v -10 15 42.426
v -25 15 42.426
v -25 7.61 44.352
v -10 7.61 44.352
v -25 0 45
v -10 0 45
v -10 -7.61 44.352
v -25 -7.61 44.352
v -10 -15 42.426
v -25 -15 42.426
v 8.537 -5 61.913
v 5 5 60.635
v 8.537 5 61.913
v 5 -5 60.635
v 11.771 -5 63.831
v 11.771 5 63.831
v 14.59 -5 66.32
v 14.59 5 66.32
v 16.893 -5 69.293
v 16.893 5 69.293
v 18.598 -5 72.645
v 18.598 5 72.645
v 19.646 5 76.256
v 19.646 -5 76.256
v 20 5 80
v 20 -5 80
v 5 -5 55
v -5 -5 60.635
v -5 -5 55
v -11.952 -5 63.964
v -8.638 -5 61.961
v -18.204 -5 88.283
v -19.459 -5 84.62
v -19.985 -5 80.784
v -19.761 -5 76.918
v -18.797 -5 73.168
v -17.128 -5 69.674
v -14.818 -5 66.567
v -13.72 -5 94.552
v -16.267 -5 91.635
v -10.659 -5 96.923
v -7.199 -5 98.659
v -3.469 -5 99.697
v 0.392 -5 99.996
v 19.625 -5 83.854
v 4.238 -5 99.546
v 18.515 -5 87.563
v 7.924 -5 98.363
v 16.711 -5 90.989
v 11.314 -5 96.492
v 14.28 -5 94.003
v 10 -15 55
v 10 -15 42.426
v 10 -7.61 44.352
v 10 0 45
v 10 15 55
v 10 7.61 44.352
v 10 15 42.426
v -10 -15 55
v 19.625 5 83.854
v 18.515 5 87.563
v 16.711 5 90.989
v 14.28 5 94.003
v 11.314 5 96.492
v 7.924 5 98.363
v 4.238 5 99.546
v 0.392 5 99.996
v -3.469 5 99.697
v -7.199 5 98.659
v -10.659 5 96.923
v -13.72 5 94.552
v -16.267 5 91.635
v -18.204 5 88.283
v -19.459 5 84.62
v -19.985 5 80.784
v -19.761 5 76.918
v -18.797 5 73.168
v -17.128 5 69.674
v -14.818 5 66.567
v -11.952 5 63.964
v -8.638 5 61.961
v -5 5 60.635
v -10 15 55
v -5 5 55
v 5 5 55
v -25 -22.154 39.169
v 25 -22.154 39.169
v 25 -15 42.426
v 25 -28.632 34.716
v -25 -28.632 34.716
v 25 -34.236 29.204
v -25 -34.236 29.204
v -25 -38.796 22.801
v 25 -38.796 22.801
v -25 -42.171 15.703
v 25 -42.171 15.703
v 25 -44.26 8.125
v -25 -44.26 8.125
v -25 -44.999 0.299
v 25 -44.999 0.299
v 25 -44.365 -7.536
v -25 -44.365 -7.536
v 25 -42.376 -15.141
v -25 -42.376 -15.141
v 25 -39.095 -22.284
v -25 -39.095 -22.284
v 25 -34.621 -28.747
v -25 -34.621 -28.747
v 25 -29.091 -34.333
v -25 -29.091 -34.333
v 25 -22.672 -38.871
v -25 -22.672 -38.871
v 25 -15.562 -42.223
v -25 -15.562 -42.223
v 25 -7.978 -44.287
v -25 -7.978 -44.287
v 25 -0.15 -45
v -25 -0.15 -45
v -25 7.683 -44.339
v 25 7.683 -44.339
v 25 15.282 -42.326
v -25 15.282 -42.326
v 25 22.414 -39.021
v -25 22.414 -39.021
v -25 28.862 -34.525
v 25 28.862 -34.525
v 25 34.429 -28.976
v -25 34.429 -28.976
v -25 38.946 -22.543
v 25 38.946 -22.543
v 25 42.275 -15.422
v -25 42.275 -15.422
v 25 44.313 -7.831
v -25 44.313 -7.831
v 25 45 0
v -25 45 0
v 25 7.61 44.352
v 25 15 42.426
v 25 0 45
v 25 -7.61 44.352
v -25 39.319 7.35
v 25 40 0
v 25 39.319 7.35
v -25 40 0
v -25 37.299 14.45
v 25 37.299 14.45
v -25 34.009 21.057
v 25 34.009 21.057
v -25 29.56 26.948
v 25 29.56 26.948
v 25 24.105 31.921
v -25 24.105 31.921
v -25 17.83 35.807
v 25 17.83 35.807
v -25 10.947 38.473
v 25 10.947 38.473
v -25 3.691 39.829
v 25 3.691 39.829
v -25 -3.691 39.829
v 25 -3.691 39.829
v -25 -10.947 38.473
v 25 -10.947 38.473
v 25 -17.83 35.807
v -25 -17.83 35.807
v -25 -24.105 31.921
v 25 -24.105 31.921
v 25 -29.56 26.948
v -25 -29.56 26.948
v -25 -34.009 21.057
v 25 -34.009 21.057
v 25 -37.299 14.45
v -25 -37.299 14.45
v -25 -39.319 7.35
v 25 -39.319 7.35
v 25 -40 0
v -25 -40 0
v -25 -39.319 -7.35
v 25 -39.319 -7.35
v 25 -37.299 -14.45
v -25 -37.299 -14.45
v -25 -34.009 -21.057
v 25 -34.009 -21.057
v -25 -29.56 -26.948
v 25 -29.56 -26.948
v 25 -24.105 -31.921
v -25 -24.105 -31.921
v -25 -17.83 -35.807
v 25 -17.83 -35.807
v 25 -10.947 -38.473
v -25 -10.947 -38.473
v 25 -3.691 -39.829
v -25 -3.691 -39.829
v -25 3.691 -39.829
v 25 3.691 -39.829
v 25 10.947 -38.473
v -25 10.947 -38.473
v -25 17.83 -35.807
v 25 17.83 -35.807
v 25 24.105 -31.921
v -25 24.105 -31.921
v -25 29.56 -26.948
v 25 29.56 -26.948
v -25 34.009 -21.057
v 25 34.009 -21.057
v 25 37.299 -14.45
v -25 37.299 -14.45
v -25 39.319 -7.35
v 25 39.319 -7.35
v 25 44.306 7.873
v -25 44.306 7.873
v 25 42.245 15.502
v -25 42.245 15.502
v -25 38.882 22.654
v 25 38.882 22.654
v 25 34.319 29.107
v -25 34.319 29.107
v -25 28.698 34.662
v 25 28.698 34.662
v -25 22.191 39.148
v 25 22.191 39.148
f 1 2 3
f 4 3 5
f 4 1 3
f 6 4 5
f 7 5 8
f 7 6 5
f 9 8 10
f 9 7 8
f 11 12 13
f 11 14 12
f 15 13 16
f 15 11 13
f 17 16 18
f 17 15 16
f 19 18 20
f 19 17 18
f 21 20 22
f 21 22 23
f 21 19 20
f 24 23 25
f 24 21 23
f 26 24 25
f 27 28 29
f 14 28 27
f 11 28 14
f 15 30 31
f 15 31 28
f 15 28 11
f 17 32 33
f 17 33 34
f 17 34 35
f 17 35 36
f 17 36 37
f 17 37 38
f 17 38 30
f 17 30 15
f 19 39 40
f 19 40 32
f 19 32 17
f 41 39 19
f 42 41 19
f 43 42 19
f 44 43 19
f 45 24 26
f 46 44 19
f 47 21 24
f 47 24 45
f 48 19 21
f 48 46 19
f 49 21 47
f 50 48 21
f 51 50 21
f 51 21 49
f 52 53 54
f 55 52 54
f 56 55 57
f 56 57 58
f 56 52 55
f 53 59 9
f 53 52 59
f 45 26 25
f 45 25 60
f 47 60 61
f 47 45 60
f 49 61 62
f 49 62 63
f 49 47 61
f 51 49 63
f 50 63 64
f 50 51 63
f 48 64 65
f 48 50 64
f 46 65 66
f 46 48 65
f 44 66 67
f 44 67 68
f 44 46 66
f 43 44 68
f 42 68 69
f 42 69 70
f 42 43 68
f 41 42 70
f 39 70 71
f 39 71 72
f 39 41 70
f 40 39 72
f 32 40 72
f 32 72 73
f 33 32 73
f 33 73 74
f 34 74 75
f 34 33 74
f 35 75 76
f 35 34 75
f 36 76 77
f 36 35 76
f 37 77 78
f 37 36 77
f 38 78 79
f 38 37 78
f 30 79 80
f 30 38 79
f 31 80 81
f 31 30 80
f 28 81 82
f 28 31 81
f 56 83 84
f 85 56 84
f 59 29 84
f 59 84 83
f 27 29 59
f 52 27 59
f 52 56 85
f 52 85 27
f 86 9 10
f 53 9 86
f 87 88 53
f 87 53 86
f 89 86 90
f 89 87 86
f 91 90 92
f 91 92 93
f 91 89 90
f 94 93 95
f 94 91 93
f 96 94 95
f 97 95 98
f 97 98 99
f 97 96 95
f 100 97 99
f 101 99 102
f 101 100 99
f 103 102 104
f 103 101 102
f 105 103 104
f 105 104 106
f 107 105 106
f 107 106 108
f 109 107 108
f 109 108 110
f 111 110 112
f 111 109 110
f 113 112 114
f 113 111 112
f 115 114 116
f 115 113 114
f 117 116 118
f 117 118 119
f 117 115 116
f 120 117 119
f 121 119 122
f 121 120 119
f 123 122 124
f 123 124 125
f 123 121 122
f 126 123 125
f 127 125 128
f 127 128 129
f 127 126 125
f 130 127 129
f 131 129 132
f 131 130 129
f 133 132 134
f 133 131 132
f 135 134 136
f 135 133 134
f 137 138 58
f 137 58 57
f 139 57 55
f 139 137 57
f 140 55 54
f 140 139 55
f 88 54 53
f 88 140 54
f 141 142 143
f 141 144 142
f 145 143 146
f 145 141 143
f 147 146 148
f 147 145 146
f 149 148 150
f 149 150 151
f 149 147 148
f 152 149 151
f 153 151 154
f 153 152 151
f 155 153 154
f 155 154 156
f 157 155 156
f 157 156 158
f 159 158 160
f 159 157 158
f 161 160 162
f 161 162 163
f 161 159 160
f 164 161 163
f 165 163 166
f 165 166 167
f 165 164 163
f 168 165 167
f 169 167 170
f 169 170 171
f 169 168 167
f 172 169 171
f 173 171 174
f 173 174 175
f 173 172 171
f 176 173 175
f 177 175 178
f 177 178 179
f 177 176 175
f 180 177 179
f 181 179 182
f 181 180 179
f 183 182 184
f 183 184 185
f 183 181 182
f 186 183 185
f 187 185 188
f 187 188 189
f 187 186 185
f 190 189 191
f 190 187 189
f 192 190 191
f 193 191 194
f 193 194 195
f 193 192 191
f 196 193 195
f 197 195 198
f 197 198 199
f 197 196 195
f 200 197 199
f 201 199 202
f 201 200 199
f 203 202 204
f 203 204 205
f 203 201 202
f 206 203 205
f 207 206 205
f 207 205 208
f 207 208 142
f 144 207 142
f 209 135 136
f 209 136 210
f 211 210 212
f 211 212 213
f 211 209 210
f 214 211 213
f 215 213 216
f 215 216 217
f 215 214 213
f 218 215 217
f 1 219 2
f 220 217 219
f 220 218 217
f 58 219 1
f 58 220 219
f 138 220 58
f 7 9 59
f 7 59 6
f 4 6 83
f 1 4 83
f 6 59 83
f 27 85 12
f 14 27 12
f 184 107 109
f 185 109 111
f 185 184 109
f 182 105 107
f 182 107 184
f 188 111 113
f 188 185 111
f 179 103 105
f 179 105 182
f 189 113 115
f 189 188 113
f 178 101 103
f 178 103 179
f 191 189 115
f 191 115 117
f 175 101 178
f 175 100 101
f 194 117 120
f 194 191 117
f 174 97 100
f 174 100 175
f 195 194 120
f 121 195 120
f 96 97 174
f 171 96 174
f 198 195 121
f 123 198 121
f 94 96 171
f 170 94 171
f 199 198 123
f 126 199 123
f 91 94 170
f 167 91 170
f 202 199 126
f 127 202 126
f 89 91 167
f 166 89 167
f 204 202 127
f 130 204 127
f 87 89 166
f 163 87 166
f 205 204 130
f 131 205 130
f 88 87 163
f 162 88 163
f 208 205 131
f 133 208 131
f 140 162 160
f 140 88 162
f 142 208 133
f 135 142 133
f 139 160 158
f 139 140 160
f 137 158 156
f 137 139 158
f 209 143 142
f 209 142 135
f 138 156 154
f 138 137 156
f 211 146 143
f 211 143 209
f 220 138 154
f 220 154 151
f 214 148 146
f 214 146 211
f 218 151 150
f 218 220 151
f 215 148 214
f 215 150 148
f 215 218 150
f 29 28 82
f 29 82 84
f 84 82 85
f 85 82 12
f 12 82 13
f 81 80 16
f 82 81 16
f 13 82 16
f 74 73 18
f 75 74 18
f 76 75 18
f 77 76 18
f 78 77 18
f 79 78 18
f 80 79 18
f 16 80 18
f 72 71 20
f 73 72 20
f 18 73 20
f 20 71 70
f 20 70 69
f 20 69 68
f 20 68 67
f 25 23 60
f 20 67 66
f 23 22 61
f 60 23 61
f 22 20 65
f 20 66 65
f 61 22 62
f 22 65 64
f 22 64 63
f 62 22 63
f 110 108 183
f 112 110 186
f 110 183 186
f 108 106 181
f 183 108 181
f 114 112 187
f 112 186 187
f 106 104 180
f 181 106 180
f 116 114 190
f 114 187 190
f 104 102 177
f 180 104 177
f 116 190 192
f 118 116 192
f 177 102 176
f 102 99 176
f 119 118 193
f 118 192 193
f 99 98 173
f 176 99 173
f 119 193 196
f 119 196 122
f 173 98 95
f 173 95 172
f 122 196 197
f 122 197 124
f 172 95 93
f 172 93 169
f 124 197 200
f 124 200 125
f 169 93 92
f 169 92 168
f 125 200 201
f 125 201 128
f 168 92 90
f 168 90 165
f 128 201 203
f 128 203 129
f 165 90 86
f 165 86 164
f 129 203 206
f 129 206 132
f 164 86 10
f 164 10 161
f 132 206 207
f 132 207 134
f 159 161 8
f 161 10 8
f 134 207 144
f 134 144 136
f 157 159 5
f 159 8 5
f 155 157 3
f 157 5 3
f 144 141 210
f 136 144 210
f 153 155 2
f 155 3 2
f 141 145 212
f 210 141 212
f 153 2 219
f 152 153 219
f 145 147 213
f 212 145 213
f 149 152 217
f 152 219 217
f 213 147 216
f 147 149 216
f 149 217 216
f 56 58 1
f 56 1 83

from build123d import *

# Parameters (mm, degrees)
F0_R     = 40
F1_DEPTH = 25
F2_DEPTH = 10
F4_DEPTH = 5


with BuildPart() as f1:
    # F0 (on Right) → F1 (new body, symmetric)
    with BuildSketch(Plane.YZ):
        with BuildLine():
            ThreePointArc((-15, 42.426407), (-25.980762, -36.742346), (45, 0))
            ThreePointArc((45, 0), (36.742346, 25.980762), (15, 42.426407))
            ThreePointArc((15, 42.426407), (0, 45), (-15, 42.426407))
        make_face()
        Circle(F0_R, mode=Mode.SUBTRACT)
    extrude(amount=F1_DEPTH, both=True)

    # F0 (on Right) → F2 (join, symmetric)
    with BuildSketch(Plane.YZ):
        with BuildLine():
            ThreePointArc((-15, 42.426407), (0, 45), (15, 42.426407))
            Line((15, 42.426407), (15, 55))
            Line((15, 55), (-15, 55))
            Line((-15, 55), (-15, 42.426407))
        make_face()
    extrude(amount=F2_DEPTH, both=True)

    # F3 (on Front) → F4 (join, symmetric)
    with BuildSketch(Plane.XZ):
        with BuildLine():
            ThreePointArc((-5, 60.635083), (0, 60), (5, 60.635083))
            ThreePointArc((5, 60.635083), (15.811388, 67.752551), (20, 80))
            ThreePointArc((20, 80), (-12.247449, 95.811388), (-5, 60.635083))
        make_face()
        with BuildLine():
            Line((-5, 55), (5, 55))
            Line((5, 55), (5, 60.635083))
            ThreePointArc((5, 60.635083), (0, 60), (-5, 60.635083))
            Line((-5, 60.635083), (-5, 55))
        make_face()
    extrude(amount=F4_DEPTH, both=True)


solid = f1.part
